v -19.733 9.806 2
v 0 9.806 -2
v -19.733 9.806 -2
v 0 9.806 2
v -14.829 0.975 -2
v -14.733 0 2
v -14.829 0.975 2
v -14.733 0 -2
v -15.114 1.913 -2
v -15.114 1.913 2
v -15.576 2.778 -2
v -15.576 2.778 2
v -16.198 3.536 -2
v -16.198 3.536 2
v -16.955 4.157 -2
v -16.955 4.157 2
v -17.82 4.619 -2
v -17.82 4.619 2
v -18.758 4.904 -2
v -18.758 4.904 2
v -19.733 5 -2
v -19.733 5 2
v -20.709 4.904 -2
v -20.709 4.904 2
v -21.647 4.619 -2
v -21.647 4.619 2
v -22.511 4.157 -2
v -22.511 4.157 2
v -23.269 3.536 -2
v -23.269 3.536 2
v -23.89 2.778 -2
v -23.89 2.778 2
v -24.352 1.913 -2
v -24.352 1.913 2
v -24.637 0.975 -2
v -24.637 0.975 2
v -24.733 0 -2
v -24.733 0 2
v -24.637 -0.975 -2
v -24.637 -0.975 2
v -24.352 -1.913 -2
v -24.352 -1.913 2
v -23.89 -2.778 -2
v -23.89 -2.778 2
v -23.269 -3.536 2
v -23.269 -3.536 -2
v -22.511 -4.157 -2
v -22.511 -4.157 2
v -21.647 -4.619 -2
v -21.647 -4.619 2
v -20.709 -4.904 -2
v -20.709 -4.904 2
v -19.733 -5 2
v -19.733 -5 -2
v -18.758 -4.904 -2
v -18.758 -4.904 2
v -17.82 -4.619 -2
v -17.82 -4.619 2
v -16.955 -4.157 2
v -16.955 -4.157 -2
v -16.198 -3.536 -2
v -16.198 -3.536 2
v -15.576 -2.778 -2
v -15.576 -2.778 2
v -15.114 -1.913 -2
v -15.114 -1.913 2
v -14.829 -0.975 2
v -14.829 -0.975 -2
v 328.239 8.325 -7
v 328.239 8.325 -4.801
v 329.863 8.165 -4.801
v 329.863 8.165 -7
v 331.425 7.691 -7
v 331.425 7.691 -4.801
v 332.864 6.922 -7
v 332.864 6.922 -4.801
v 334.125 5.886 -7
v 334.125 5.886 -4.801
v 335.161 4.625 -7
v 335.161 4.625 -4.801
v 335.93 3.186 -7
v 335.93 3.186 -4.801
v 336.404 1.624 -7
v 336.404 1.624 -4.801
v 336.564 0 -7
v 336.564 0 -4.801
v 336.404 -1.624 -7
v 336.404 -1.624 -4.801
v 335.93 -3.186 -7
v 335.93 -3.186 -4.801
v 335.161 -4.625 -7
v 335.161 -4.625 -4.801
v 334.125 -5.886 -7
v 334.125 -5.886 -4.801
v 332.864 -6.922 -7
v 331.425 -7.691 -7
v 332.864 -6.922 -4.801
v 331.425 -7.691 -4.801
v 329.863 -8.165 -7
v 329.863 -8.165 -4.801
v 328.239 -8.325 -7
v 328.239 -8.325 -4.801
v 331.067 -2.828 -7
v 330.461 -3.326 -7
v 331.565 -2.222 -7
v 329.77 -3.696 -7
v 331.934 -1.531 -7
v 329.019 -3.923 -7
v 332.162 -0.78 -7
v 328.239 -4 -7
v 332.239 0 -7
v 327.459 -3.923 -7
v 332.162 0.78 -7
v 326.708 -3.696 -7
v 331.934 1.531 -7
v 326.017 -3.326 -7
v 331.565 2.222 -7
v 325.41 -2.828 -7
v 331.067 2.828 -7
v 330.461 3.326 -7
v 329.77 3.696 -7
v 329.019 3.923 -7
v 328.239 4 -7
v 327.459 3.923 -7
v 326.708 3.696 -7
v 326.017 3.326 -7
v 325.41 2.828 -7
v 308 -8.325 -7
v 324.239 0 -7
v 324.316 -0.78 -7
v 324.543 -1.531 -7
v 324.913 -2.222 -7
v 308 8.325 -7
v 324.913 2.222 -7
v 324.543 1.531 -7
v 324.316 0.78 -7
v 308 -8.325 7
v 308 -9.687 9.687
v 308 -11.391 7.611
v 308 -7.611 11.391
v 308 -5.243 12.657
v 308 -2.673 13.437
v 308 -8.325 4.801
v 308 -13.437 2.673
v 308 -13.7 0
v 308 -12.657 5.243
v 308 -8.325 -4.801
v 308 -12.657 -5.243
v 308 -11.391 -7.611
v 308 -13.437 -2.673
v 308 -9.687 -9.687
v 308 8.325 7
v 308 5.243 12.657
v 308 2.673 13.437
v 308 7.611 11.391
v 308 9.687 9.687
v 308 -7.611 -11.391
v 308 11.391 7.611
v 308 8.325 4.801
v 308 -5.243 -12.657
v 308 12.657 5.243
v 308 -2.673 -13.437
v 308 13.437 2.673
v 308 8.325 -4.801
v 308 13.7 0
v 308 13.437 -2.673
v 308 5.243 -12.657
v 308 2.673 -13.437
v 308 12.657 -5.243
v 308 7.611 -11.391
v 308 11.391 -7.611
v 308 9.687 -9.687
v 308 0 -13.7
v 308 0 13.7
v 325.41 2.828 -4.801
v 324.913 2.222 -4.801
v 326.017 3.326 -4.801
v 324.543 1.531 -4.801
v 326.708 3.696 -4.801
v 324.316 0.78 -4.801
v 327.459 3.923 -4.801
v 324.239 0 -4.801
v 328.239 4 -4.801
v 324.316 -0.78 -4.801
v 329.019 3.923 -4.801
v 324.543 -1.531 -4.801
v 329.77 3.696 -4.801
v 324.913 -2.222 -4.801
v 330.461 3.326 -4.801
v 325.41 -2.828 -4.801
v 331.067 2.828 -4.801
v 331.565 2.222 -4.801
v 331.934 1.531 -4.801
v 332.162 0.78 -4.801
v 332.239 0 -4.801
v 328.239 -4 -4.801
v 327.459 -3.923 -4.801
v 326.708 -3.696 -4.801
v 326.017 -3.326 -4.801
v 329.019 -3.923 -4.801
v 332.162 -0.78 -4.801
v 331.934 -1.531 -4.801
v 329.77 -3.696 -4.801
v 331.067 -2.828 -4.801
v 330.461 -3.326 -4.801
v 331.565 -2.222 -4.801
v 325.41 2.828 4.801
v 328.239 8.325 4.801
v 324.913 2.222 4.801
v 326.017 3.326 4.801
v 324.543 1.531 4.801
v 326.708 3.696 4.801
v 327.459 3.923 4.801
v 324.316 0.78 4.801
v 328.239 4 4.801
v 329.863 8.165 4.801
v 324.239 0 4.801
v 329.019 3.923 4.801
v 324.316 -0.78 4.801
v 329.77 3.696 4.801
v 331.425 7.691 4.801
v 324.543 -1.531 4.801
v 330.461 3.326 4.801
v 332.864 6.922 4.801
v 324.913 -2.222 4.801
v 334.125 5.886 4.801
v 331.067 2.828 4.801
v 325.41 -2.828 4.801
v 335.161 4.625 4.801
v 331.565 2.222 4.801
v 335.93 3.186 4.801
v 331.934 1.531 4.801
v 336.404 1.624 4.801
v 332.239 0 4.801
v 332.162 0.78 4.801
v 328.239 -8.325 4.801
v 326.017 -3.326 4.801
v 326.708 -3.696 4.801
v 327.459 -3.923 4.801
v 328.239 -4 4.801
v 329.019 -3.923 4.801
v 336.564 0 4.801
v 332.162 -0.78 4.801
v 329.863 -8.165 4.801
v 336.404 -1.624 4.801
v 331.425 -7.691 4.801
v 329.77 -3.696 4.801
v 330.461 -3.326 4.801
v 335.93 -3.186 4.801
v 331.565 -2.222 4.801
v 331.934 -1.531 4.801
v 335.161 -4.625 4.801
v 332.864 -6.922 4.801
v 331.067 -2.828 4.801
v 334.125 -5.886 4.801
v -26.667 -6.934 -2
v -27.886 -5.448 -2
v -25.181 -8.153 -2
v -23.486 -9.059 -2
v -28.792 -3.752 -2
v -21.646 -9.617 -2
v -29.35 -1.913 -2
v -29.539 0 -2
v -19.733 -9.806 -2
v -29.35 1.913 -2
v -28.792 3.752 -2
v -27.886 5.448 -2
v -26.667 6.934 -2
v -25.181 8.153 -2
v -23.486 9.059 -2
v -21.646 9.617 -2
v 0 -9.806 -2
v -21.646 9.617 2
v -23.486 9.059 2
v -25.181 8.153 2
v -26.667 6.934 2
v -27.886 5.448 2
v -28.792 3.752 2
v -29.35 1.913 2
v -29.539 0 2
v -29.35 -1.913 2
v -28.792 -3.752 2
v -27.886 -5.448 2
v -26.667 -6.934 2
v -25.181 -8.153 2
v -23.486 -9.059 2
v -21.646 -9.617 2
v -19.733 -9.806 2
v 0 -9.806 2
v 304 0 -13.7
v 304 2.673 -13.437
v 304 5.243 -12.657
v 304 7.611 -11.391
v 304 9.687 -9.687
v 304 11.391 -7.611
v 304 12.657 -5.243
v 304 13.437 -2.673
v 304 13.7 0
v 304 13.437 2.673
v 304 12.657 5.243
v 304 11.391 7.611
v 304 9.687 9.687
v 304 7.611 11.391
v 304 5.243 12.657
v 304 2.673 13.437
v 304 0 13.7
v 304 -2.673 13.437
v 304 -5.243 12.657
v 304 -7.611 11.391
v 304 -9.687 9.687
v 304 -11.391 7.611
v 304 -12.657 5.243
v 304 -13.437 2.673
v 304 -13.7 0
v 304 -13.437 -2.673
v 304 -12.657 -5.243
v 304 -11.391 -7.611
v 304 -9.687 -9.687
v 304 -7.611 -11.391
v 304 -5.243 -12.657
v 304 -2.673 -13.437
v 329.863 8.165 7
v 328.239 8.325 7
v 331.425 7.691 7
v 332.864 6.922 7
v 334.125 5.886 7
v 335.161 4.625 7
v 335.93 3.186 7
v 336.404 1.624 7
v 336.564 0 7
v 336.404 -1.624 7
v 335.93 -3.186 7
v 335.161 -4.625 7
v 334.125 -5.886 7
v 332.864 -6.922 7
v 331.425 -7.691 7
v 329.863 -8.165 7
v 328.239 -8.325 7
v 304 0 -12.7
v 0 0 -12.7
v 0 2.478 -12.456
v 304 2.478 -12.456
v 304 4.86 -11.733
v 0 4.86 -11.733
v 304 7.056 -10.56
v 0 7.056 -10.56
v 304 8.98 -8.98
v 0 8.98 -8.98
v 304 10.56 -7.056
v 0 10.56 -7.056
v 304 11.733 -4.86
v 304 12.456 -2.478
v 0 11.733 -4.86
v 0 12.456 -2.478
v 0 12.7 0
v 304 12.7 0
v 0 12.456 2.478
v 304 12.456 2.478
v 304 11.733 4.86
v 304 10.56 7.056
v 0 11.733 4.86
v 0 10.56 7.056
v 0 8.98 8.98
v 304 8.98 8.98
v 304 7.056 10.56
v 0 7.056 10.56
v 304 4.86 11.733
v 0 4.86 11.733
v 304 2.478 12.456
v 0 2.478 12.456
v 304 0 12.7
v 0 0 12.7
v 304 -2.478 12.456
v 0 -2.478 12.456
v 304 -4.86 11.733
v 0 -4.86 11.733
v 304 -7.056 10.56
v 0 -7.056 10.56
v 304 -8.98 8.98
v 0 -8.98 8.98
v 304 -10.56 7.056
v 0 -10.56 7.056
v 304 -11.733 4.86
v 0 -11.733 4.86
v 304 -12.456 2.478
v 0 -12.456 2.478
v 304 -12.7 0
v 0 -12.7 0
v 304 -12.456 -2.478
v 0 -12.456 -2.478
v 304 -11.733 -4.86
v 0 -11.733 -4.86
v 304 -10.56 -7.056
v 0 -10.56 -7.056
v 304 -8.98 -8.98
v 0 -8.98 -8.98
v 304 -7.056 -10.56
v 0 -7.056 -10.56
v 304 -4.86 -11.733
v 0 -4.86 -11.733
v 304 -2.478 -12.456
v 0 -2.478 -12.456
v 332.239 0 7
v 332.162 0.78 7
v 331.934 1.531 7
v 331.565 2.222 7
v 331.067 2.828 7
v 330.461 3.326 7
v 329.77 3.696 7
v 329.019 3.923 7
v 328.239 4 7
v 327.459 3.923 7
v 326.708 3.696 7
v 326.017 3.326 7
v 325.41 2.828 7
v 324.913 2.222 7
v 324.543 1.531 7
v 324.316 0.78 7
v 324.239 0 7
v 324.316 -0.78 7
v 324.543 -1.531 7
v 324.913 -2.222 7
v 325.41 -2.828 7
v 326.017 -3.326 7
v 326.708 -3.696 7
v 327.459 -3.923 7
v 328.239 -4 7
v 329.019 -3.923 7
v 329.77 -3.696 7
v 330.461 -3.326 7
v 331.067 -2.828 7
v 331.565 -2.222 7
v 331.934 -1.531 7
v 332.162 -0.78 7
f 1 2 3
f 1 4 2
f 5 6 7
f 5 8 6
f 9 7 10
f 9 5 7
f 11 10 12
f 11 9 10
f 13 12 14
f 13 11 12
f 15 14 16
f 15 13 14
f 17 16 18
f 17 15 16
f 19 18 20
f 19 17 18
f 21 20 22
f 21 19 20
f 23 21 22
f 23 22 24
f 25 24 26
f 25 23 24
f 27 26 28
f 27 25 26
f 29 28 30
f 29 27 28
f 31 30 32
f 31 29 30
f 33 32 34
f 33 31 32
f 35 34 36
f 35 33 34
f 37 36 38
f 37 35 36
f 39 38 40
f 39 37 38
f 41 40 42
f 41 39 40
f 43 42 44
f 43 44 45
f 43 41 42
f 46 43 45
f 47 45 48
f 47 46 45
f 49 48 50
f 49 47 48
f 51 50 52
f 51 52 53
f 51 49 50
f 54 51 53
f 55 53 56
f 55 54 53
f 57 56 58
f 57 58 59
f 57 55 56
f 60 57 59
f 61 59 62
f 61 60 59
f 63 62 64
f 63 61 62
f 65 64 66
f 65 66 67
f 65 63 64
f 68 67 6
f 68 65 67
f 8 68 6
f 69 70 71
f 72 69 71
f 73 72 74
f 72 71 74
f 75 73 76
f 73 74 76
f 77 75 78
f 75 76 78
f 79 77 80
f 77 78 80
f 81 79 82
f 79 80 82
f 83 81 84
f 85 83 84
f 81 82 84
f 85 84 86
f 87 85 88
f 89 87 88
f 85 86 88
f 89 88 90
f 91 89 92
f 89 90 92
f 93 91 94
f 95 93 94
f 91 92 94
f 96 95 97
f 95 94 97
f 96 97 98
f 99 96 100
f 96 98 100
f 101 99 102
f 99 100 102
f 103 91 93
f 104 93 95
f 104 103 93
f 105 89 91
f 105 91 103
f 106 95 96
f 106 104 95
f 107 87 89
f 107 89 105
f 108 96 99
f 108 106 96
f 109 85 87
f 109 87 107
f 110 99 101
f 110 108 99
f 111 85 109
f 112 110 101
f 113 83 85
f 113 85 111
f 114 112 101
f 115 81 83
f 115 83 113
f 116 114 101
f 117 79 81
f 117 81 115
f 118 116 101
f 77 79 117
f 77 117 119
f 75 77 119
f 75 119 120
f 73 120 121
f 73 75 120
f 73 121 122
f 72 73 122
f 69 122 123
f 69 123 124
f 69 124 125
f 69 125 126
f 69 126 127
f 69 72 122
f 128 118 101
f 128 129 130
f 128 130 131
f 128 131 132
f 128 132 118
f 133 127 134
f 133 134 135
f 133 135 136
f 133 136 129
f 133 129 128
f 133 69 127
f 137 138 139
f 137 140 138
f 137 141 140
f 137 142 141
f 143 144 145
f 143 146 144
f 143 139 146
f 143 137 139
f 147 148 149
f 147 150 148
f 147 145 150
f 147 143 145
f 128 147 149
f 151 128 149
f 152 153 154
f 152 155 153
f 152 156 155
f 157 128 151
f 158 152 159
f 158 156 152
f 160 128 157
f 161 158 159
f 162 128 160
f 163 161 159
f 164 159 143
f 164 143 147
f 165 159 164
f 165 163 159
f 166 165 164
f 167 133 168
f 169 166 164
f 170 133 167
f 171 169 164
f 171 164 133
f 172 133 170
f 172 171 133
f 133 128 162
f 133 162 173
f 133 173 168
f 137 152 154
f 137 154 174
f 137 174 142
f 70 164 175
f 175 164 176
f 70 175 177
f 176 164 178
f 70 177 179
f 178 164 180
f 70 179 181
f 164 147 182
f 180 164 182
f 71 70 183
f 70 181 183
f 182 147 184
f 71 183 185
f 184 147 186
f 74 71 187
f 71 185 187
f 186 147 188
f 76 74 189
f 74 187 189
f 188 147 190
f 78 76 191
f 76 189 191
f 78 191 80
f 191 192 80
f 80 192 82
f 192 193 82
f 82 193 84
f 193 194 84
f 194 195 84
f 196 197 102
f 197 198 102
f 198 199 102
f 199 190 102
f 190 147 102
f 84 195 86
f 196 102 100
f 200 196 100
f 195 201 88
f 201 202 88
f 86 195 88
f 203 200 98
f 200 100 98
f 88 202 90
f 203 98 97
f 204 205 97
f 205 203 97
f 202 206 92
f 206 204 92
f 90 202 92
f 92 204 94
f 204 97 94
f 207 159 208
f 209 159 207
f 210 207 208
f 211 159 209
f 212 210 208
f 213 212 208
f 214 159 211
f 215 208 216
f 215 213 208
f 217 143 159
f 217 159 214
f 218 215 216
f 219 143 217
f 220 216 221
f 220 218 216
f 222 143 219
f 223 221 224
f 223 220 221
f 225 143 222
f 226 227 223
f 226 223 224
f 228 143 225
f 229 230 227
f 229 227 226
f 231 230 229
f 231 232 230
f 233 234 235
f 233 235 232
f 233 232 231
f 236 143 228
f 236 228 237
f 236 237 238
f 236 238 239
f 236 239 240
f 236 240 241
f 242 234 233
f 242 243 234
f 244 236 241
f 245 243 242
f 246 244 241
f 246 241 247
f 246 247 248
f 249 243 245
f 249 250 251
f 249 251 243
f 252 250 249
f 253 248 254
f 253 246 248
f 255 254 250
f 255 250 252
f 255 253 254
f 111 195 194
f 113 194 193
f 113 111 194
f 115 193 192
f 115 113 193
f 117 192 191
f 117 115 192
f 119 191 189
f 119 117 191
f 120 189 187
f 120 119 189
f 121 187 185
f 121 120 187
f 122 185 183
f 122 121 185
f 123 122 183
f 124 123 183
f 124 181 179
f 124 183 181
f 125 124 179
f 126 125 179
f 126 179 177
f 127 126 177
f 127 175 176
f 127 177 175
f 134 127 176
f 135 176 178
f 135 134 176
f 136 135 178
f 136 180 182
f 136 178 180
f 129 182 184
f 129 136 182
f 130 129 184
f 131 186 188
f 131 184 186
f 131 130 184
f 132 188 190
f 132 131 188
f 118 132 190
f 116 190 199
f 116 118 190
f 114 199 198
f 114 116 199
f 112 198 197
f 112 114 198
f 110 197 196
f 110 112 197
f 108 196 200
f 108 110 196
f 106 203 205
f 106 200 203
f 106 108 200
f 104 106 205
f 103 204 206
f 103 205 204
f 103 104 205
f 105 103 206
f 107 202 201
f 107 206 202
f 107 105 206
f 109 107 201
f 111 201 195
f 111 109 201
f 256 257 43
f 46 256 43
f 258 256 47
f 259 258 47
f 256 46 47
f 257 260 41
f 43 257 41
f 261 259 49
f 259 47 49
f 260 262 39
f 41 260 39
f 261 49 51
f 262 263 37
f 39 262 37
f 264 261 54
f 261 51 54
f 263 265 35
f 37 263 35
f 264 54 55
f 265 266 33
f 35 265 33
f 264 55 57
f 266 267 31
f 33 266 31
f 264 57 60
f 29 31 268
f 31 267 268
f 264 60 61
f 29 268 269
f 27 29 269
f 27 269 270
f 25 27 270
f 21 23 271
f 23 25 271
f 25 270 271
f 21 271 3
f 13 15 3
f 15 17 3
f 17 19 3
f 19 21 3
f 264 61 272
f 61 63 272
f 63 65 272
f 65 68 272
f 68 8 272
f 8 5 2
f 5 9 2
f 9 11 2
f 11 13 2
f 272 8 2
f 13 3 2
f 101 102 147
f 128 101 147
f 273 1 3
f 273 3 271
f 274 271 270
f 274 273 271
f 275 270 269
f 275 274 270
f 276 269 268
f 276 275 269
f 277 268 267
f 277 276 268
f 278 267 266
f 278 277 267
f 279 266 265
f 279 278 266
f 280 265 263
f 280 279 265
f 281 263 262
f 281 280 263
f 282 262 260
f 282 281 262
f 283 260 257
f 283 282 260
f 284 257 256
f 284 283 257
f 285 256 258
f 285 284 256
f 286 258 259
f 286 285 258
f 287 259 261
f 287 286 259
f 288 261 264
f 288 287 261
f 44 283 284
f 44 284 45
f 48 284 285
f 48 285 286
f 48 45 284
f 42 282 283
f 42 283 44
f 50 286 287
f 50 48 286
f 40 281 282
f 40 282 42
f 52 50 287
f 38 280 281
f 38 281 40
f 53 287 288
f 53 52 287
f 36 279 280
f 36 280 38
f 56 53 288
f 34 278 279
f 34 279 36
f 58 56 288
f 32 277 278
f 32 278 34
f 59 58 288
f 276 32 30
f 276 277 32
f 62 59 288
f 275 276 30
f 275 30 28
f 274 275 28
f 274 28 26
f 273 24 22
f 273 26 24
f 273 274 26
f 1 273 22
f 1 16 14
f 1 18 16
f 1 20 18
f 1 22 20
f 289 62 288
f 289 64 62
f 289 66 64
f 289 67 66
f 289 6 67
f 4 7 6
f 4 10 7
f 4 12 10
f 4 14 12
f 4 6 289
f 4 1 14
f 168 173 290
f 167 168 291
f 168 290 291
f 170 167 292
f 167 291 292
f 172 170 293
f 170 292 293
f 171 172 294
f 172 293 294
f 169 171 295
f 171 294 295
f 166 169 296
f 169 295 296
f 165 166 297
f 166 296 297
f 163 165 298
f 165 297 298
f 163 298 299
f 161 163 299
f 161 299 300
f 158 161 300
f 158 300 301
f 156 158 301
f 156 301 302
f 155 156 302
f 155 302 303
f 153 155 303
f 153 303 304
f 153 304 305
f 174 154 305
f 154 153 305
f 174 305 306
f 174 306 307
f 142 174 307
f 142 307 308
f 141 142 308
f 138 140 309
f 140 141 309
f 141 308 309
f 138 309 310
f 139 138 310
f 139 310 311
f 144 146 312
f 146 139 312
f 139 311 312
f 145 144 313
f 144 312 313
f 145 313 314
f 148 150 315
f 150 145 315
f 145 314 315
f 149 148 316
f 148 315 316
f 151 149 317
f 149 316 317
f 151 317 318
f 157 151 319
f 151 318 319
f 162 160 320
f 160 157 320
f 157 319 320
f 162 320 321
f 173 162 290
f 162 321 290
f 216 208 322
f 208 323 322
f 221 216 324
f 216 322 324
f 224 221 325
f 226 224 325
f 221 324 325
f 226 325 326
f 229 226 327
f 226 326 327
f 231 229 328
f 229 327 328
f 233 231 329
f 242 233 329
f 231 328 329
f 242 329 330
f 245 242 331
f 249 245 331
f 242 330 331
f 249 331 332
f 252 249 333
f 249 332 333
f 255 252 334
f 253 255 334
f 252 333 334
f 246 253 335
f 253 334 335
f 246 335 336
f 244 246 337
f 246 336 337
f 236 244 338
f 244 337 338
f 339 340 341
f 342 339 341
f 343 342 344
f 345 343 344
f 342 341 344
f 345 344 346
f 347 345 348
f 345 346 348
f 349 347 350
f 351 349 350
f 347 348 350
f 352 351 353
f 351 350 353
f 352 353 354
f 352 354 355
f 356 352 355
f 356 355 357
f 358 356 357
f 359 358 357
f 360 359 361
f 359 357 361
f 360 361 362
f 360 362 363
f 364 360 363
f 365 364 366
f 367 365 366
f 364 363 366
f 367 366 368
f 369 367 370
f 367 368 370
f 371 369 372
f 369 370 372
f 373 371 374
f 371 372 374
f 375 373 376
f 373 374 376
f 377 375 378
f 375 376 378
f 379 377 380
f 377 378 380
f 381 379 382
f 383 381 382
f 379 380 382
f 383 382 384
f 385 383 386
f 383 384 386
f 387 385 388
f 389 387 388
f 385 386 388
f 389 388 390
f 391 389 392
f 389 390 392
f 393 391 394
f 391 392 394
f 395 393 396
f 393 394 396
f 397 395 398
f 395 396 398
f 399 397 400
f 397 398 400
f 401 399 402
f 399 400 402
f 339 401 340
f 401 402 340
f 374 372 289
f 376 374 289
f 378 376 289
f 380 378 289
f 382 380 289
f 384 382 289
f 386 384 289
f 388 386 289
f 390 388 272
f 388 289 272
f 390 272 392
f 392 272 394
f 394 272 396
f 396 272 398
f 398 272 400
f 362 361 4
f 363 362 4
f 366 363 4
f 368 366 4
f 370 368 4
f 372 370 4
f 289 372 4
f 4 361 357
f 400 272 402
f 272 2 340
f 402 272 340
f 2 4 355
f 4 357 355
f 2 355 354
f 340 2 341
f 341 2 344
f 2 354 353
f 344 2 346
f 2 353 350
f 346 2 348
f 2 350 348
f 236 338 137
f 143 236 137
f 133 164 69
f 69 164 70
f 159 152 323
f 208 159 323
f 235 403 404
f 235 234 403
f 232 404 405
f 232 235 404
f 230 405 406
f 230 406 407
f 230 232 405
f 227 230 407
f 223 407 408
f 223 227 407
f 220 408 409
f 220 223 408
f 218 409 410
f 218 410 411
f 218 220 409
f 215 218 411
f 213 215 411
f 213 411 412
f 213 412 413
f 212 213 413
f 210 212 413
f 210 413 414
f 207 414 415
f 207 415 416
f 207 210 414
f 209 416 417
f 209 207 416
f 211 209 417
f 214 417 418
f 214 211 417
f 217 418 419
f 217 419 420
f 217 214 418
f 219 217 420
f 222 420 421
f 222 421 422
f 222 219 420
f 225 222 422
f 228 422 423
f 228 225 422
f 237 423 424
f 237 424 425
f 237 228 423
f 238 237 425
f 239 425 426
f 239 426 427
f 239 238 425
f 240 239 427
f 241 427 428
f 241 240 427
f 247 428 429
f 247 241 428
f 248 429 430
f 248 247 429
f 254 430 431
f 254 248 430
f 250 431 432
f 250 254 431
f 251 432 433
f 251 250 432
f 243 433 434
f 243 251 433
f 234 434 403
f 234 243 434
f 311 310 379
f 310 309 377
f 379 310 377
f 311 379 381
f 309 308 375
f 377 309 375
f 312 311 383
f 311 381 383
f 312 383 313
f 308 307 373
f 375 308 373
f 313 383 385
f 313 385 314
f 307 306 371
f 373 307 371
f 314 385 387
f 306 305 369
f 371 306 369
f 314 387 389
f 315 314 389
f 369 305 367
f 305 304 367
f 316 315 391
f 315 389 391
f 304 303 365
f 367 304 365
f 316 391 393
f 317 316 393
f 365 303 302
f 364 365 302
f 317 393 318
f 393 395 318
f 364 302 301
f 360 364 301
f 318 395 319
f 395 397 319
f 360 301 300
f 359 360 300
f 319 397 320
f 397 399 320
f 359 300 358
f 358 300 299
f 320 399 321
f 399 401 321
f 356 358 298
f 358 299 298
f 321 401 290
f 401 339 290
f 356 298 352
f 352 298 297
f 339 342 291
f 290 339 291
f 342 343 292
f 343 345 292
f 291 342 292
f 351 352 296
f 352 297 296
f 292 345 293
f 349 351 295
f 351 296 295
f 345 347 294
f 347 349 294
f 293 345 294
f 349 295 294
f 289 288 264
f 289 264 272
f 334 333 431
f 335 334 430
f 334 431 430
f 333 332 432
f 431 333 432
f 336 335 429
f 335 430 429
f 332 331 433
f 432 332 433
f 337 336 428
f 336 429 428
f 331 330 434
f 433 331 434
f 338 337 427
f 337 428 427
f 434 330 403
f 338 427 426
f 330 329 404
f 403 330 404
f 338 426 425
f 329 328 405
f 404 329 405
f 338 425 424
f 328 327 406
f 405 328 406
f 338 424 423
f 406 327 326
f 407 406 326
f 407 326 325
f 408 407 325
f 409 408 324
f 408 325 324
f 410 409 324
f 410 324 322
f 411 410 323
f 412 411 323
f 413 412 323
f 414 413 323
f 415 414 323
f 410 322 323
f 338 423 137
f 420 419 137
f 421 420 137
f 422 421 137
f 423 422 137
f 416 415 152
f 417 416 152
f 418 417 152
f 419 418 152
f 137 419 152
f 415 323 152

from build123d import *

# Parameters (mm, degrees)
SKETCH1_R               = 12.7
EXTRUDE1_DEPTH          = 304
SKETCH2_R               = 5
EXTRUDE2_DEPTH          = 2
SKETCH3_R               = 13.7
EXTRUDE3_DEPTH          = 4
SKETCH4_R               = 4
EXTRUDE4_DEPTH          = 7
SKETCH5_W               = 51.727972269
SKETCH5_H               = 9.602426348
CUT_EXTRUDE1_DEPTH      = 14.7
CUT_EXTRUDE1_DEPTH_BACK = 14.7


with BuildPart() as part:
    # Sketch1 → Extrude1 (new body)
    with BuildSketch(Plane(origin=(0, 0, 0), x_dir=(0, 0, -1), z_dir=(1, 0, 0))):
        Circle(SKETCH1_R)
    extrude(amount=EXTRUDE1_DEPTH)

    # Sketch2 → Extrude2 (add, symmetric)
    with BuildSketch(Plane.XY):
        with BuildLine():
            Line((0, 9.805687548), (-19.733094472, 9.805687548))
            ThreePointArc((-19.733094472, 9.805687548), (-29.53878202, 0), (-19.733094472, -9.805687548))
            Line((-19.733094472, -9.805687548), (0, -9.805687548))
            Line((0, -9.805687548), (0, 9.805687548))
        make_face()
        with Locations((-19.733094472, 0)):
            Circle(SKETCH2_R, mode=Mode.SUBTRACT)
    extrude(amount=EXTRUDE2_DEPTH, both=True)

    # Sketch3 → Extrude3 (add)
    with BuildSketch(Plane(origin=(304, 0, 0), x_dir=(0, 0, -1), z_dir=(1, 0, 0))):
        Circle(SKETCH3_R)
    extrude(amount=EXTRUDE3_DEPTH)

    # Sketch4 → Extrude4 (add, symmetric)
    with BuildSketch(Plane.XY):
        with BuildLine():
            Line((308, 8.324679236), (328.238920727, 8.324679236))
            ThreePointArc((328.238920727, 8.324679236), (336.563599963, 0), (328.238920727, -8.324679236))
            Line((328.238920727, -8.324679236), (308, -8.324679236))
            Line((308, -8.324679236), (308, 8.324679236))
        make_face()
        with Locations((328.238920727, 0)):
            Circle(SKETCH4_R, mode=Mode.SUBTRACT)
    extrude(amount=EXTRUDE4_DEPTH, both=True)

    # Sketch5 → Cut-Extrude1 (cut, two sides)
    with BuildSketch(Plane(origin=(0, 0, 0), x_dir=(1, 0, 0), z_dir=(0, 1, 0))) as cut_extrude1_sk:
        with Locations((333.863986135, 0)):
            Rectangle(SKETCH5_W, SKETCH5_H)
    extrude(amount=CUT_EXTRUDE1_DEPTH, mode=Mode.SUBTRACT)
    extrude(cut_extrude1_sk.sketch, amount=-CUT_EXTRUDE1_DEPTH_BACK, mode=Mode.SUBTRACT)


solid = part.part
